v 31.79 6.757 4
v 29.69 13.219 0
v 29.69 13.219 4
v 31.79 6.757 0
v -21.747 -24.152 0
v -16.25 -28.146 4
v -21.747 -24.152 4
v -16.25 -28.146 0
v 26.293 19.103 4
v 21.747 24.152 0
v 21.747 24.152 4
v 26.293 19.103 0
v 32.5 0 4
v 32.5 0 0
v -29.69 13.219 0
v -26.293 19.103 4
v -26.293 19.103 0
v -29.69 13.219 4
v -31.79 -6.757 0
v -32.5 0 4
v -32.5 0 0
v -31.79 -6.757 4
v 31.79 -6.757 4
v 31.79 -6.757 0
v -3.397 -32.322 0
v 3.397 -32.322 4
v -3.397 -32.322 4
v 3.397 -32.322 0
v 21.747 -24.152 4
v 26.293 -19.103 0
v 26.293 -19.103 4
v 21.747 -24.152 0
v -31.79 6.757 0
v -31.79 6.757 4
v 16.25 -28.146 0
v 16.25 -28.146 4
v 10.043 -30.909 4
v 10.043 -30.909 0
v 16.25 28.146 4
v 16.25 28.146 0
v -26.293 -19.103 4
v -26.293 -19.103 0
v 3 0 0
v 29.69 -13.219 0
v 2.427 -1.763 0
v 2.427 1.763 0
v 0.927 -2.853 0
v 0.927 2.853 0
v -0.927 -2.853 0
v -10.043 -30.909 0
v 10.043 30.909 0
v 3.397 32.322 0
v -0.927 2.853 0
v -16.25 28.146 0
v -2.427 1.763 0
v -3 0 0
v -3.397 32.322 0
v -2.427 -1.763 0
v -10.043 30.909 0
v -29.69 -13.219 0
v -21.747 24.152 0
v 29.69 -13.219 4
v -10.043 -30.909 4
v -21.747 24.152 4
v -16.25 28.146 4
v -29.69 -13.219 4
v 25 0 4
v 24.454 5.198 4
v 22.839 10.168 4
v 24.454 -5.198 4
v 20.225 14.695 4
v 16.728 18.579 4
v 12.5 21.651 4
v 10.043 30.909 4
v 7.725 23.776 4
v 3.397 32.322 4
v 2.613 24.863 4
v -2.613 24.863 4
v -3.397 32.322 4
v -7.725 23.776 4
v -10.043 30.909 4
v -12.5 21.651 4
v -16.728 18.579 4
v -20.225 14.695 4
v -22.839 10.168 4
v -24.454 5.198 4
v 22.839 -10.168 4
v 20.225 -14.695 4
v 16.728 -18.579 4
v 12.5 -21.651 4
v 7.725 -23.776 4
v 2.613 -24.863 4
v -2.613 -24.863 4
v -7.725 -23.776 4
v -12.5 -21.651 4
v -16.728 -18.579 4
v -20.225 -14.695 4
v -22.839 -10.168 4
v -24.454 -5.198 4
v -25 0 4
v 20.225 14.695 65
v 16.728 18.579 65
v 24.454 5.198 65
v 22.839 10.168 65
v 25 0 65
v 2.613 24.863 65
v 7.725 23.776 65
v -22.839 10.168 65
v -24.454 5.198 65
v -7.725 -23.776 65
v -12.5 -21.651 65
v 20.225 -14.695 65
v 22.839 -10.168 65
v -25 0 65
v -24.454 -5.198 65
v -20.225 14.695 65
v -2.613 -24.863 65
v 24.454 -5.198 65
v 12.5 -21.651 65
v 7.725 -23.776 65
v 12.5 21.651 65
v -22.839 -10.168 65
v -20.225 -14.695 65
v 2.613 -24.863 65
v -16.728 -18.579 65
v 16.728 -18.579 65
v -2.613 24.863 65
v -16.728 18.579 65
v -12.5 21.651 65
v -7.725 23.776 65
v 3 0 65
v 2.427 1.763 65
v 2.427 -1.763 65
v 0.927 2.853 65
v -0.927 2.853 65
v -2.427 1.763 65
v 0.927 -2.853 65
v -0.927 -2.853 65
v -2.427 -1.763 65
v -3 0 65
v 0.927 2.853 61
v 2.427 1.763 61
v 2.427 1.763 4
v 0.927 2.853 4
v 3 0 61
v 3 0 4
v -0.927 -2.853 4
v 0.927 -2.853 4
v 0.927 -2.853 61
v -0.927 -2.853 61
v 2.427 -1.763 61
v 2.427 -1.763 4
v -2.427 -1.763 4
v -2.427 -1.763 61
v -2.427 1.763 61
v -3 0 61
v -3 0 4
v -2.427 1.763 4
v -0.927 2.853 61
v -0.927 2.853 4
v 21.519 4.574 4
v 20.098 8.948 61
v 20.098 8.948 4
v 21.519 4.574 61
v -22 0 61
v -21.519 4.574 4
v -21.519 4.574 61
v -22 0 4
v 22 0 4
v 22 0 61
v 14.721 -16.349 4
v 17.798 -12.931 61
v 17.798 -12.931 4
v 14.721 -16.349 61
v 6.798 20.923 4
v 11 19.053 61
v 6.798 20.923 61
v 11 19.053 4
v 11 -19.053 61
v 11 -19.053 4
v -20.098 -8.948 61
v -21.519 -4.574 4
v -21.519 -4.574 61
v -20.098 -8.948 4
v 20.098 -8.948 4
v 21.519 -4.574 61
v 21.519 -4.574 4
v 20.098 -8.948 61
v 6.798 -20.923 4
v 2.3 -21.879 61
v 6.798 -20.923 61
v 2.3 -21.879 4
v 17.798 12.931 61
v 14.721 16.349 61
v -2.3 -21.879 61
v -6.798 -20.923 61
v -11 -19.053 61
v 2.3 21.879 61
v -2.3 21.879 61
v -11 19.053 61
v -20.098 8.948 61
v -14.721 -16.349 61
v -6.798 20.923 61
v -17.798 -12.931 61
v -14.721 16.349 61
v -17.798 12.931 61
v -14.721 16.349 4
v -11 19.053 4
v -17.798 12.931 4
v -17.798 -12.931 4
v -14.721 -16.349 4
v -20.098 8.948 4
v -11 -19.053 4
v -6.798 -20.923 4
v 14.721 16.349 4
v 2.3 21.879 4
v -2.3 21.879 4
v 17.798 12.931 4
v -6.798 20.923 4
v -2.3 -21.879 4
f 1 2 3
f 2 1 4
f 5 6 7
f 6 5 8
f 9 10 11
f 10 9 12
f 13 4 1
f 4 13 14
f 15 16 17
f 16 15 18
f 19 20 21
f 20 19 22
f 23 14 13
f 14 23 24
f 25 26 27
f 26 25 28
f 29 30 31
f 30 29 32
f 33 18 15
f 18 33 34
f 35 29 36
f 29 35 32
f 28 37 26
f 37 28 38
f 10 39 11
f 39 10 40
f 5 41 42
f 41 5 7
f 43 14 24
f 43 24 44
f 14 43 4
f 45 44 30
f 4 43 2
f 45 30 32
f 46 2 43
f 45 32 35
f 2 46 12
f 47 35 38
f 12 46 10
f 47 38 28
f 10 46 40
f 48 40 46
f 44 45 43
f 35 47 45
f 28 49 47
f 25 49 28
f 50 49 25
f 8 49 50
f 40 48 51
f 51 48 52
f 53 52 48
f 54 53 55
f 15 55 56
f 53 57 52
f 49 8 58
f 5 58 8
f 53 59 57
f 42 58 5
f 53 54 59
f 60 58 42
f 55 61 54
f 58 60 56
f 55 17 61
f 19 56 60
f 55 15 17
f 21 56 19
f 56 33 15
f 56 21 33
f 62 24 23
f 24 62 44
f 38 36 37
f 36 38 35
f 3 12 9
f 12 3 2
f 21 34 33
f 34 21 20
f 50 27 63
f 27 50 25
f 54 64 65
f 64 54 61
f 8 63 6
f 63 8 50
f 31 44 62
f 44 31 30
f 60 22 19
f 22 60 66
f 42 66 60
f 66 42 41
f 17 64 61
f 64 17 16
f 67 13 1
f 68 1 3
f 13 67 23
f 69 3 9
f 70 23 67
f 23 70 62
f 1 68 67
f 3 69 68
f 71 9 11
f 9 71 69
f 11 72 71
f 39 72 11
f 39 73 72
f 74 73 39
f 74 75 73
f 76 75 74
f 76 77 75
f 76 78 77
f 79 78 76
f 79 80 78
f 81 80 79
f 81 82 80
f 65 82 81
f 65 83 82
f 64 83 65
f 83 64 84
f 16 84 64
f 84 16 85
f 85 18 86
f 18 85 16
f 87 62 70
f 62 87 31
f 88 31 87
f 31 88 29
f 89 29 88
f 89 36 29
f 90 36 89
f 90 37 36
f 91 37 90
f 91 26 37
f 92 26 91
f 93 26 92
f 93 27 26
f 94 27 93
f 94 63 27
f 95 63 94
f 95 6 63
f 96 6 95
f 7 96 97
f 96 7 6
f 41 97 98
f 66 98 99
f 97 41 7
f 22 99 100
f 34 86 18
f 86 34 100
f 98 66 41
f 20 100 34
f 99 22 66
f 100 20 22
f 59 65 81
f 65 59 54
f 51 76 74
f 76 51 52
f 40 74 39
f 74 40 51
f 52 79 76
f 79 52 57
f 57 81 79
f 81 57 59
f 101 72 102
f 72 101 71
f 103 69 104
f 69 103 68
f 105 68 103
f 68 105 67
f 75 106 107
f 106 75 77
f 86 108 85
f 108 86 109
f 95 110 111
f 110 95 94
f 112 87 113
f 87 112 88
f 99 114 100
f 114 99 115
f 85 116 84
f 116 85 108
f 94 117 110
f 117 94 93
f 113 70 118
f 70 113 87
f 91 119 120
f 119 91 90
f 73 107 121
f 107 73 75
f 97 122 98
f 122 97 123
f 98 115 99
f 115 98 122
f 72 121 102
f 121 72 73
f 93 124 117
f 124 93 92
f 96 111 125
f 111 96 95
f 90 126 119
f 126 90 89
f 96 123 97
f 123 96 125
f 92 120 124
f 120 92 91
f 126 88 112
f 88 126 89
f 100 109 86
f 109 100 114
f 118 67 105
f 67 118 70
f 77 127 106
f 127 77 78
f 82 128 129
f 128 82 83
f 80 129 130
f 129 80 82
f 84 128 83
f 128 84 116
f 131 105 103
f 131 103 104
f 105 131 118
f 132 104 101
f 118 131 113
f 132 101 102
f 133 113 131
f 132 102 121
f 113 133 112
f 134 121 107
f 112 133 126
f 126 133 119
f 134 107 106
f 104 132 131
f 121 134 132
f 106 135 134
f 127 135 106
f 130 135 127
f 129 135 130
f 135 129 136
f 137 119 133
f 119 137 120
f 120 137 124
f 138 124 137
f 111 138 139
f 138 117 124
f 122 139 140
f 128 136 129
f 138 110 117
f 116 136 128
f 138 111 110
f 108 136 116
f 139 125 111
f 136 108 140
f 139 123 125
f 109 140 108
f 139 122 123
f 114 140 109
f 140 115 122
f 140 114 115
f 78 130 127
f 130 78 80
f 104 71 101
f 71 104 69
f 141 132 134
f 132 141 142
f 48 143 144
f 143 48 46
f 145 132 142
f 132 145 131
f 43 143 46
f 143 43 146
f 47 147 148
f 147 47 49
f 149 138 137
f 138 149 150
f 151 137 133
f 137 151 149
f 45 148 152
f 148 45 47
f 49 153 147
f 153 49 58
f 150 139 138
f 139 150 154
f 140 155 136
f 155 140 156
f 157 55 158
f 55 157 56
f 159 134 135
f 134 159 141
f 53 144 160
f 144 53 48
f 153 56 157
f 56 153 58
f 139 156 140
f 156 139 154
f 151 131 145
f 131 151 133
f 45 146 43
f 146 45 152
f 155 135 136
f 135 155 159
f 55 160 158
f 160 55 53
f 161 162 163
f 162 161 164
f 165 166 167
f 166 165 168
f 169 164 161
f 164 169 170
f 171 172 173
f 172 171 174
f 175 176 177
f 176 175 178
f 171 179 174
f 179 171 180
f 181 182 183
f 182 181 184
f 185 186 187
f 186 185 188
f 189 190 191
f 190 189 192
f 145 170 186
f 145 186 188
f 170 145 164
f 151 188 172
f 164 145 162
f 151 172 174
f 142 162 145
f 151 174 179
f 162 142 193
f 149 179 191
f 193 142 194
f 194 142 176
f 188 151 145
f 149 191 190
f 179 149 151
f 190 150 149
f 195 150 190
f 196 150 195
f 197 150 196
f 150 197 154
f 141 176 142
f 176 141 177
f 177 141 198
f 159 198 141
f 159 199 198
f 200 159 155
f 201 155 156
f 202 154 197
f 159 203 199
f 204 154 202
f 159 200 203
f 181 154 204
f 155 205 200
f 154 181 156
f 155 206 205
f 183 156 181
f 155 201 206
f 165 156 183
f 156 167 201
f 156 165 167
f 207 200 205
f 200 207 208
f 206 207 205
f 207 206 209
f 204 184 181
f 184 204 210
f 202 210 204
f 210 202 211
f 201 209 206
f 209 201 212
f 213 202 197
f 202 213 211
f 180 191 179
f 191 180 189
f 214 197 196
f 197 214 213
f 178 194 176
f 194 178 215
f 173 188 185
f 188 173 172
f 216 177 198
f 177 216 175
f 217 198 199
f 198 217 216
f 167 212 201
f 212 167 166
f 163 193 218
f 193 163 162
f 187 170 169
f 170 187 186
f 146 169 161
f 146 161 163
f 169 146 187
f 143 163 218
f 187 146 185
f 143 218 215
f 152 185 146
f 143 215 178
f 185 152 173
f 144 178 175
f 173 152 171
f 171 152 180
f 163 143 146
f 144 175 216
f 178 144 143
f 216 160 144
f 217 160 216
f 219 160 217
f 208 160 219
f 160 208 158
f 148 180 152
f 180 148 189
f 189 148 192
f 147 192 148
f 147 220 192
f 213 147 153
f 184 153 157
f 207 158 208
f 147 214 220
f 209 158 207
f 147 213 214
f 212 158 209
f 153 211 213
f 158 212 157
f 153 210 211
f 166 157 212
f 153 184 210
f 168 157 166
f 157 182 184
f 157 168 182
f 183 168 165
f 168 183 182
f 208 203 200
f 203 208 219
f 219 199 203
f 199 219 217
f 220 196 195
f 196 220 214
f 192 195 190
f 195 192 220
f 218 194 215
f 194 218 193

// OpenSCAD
difference() {
    union() {
        linear_extrude(4)
            circle(32.5);
        linear_extrude(65)
            circle(25);
    }
    linear_extrude(65)
        circle(3);
    translate([0, 0, 4])
        linear_extrude(57)
        circle(22);
}
